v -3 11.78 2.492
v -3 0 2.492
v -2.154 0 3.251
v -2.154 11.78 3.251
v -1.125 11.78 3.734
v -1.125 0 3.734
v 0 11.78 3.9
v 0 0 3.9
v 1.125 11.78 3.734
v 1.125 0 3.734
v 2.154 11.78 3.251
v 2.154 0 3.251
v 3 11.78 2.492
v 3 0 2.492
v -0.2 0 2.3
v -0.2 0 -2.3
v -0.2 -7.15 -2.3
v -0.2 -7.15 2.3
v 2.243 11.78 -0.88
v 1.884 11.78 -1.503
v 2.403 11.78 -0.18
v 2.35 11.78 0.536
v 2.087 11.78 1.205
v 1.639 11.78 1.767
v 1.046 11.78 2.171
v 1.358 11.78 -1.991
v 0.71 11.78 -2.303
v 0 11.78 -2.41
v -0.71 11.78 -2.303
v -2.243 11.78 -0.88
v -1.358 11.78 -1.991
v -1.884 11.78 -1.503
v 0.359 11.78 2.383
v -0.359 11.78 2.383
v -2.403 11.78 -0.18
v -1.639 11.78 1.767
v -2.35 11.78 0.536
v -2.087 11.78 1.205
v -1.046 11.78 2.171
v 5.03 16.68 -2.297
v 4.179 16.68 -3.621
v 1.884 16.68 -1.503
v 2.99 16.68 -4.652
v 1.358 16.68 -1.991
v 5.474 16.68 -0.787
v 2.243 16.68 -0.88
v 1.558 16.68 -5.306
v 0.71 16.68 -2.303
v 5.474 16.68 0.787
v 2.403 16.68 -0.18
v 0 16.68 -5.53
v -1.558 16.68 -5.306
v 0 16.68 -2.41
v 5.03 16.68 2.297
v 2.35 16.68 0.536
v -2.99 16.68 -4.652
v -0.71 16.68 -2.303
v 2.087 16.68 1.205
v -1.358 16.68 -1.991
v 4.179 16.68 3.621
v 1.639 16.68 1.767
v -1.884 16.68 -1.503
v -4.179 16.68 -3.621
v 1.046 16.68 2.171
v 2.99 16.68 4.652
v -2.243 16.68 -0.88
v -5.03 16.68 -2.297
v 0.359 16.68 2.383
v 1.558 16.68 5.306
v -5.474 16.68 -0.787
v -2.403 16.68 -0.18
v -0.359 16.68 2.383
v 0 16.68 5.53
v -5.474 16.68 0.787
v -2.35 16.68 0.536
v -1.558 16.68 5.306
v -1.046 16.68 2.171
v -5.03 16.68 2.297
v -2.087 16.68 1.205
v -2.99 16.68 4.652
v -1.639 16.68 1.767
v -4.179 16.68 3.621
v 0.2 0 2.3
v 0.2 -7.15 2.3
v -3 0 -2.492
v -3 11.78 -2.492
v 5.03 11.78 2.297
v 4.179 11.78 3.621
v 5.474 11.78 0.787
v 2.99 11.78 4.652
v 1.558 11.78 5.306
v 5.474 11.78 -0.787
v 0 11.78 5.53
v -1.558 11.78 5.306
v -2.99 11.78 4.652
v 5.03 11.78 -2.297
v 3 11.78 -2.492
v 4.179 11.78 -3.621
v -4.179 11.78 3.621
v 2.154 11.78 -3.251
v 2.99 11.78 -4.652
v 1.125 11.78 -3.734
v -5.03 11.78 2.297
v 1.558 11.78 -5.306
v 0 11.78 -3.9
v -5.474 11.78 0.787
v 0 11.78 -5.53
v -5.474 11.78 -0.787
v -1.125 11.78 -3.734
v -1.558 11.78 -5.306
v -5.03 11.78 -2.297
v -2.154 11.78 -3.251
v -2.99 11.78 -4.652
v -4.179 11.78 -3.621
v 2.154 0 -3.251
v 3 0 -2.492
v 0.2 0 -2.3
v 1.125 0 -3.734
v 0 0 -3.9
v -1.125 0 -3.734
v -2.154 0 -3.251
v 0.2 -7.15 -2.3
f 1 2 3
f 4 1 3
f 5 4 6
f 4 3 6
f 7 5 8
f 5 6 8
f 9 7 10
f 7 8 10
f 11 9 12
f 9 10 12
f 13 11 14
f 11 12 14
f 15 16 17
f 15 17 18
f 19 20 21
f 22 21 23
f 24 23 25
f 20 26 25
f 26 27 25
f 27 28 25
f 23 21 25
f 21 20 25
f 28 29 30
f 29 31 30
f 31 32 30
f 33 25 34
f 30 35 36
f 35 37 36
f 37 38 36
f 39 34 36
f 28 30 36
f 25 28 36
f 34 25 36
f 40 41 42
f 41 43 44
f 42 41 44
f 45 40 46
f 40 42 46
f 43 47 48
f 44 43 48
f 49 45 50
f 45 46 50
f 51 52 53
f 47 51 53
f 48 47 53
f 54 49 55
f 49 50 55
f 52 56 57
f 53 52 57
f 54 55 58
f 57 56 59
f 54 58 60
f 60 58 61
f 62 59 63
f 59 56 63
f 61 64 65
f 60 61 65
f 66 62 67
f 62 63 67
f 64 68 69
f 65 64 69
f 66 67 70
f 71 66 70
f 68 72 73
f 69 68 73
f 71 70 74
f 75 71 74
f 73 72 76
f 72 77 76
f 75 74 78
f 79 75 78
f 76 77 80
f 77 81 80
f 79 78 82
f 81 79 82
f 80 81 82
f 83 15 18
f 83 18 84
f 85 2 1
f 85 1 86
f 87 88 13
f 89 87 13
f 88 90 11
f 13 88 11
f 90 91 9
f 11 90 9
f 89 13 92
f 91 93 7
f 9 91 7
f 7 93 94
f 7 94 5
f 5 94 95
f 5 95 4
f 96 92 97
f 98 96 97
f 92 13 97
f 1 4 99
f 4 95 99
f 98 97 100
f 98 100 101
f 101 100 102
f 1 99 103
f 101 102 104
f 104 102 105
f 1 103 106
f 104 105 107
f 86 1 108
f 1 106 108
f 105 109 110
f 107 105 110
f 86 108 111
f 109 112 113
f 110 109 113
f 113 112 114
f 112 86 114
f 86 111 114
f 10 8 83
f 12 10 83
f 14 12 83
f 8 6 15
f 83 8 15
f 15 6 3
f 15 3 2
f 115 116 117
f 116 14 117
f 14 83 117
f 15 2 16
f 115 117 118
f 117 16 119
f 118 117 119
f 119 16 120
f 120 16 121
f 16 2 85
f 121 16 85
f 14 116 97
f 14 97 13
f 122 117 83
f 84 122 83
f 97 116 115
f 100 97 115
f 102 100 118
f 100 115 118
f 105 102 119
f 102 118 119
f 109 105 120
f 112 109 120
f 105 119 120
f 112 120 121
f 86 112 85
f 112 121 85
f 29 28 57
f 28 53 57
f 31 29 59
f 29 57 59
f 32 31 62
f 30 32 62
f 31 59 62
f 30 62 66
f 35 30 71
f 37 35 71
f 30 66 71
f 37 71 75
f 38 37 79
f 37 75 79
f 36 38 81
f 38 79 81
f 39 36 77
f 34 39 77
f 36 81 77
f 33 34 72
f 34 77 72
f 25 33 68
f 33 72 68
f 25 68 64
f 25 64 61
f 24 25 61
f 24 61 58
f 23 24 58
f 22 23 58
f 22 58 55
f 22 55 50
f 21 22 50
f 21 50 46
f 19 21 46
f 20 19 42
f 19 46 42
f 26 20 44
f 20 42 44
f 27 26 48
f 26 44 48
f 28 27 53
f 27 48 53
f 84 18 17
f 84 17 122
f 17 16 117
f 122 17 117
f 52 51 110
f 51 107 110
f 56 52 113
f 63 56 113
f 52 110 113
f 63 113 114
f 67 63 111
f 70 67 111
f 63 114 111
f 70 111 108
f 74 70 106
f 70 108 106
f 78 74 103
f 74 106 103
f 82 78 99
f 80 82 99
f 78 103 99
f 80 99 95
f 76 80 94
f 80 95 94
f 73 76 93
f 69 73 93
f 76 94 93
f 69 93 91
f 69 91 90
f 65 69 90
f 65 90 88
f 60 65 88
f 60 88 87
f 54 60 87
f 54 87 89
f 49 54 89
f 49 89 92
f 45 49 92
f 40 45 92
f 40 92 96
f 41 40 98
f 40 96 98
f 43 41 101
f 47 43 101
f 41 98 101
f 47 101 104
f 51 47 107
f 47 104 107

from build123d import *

# Parameters (mm, degrees)
CUT_EXTRUDE1_DEPTH  = 11.78
SKETCH3_W           = 0.4
SKETCH3_H           = 4.6
BOSS_EXTRUDE1_DEPTH = 7.15


with BuildPart() as part:
    # Sketch1 → Revolve1 (revolve)
    with BuildSketch(Plane(origin=(0, 0, 0), x_dir=(0, 0, -1), z_dir=(1, 0, 0)), mode=Mode.PRIVATE) as revolve1_sk:
        Polygon((-2.41, 16.68), (-5.53, 16.68), (-5.53, 11.78), (-3.9, 11.78), (-3.9, 0), (0, 0), (0, 11.78), (-2.41, 11.78), align=None)
    revolve(revolve1_sk.sketch.rotate(Axis((0, 0, 0), (0, 1, 0)), 180), axis=Axis((0, 0, 0), (0, 1, 0)))

    # Sketch2 → Cut-Extrude1 (cut)
    with BuildSketch(Plane.XZ):
        with BuildLine():
            Line((3, -2.491987159), (3, 2.491987159))
            ThreePointArc((3, 2.491987159), (3.9, 0), (3, -2.491987159))
        make_face()
        with BuildLine():
            Line((-3, 2.491987159), (-3, -2.491987159))
            ThreePointArc((-3, -2.491987159), (-3.9, 0), (-3, 2.491987159))
        make_face()
    extrude(amount=-CUT_EXTRUDE1_DEPTH, mode=Mode.SUBTRACT)

    # Sketch3 → Boss-Extrude1 (add)
    with BuildSketch(Plane.XZ):
        Rectangle(SKETCH3_W, SKETCH3_H)
    extrude(amount=BOSS_EXTRUDE1_DEPTH)


solid = part.part
